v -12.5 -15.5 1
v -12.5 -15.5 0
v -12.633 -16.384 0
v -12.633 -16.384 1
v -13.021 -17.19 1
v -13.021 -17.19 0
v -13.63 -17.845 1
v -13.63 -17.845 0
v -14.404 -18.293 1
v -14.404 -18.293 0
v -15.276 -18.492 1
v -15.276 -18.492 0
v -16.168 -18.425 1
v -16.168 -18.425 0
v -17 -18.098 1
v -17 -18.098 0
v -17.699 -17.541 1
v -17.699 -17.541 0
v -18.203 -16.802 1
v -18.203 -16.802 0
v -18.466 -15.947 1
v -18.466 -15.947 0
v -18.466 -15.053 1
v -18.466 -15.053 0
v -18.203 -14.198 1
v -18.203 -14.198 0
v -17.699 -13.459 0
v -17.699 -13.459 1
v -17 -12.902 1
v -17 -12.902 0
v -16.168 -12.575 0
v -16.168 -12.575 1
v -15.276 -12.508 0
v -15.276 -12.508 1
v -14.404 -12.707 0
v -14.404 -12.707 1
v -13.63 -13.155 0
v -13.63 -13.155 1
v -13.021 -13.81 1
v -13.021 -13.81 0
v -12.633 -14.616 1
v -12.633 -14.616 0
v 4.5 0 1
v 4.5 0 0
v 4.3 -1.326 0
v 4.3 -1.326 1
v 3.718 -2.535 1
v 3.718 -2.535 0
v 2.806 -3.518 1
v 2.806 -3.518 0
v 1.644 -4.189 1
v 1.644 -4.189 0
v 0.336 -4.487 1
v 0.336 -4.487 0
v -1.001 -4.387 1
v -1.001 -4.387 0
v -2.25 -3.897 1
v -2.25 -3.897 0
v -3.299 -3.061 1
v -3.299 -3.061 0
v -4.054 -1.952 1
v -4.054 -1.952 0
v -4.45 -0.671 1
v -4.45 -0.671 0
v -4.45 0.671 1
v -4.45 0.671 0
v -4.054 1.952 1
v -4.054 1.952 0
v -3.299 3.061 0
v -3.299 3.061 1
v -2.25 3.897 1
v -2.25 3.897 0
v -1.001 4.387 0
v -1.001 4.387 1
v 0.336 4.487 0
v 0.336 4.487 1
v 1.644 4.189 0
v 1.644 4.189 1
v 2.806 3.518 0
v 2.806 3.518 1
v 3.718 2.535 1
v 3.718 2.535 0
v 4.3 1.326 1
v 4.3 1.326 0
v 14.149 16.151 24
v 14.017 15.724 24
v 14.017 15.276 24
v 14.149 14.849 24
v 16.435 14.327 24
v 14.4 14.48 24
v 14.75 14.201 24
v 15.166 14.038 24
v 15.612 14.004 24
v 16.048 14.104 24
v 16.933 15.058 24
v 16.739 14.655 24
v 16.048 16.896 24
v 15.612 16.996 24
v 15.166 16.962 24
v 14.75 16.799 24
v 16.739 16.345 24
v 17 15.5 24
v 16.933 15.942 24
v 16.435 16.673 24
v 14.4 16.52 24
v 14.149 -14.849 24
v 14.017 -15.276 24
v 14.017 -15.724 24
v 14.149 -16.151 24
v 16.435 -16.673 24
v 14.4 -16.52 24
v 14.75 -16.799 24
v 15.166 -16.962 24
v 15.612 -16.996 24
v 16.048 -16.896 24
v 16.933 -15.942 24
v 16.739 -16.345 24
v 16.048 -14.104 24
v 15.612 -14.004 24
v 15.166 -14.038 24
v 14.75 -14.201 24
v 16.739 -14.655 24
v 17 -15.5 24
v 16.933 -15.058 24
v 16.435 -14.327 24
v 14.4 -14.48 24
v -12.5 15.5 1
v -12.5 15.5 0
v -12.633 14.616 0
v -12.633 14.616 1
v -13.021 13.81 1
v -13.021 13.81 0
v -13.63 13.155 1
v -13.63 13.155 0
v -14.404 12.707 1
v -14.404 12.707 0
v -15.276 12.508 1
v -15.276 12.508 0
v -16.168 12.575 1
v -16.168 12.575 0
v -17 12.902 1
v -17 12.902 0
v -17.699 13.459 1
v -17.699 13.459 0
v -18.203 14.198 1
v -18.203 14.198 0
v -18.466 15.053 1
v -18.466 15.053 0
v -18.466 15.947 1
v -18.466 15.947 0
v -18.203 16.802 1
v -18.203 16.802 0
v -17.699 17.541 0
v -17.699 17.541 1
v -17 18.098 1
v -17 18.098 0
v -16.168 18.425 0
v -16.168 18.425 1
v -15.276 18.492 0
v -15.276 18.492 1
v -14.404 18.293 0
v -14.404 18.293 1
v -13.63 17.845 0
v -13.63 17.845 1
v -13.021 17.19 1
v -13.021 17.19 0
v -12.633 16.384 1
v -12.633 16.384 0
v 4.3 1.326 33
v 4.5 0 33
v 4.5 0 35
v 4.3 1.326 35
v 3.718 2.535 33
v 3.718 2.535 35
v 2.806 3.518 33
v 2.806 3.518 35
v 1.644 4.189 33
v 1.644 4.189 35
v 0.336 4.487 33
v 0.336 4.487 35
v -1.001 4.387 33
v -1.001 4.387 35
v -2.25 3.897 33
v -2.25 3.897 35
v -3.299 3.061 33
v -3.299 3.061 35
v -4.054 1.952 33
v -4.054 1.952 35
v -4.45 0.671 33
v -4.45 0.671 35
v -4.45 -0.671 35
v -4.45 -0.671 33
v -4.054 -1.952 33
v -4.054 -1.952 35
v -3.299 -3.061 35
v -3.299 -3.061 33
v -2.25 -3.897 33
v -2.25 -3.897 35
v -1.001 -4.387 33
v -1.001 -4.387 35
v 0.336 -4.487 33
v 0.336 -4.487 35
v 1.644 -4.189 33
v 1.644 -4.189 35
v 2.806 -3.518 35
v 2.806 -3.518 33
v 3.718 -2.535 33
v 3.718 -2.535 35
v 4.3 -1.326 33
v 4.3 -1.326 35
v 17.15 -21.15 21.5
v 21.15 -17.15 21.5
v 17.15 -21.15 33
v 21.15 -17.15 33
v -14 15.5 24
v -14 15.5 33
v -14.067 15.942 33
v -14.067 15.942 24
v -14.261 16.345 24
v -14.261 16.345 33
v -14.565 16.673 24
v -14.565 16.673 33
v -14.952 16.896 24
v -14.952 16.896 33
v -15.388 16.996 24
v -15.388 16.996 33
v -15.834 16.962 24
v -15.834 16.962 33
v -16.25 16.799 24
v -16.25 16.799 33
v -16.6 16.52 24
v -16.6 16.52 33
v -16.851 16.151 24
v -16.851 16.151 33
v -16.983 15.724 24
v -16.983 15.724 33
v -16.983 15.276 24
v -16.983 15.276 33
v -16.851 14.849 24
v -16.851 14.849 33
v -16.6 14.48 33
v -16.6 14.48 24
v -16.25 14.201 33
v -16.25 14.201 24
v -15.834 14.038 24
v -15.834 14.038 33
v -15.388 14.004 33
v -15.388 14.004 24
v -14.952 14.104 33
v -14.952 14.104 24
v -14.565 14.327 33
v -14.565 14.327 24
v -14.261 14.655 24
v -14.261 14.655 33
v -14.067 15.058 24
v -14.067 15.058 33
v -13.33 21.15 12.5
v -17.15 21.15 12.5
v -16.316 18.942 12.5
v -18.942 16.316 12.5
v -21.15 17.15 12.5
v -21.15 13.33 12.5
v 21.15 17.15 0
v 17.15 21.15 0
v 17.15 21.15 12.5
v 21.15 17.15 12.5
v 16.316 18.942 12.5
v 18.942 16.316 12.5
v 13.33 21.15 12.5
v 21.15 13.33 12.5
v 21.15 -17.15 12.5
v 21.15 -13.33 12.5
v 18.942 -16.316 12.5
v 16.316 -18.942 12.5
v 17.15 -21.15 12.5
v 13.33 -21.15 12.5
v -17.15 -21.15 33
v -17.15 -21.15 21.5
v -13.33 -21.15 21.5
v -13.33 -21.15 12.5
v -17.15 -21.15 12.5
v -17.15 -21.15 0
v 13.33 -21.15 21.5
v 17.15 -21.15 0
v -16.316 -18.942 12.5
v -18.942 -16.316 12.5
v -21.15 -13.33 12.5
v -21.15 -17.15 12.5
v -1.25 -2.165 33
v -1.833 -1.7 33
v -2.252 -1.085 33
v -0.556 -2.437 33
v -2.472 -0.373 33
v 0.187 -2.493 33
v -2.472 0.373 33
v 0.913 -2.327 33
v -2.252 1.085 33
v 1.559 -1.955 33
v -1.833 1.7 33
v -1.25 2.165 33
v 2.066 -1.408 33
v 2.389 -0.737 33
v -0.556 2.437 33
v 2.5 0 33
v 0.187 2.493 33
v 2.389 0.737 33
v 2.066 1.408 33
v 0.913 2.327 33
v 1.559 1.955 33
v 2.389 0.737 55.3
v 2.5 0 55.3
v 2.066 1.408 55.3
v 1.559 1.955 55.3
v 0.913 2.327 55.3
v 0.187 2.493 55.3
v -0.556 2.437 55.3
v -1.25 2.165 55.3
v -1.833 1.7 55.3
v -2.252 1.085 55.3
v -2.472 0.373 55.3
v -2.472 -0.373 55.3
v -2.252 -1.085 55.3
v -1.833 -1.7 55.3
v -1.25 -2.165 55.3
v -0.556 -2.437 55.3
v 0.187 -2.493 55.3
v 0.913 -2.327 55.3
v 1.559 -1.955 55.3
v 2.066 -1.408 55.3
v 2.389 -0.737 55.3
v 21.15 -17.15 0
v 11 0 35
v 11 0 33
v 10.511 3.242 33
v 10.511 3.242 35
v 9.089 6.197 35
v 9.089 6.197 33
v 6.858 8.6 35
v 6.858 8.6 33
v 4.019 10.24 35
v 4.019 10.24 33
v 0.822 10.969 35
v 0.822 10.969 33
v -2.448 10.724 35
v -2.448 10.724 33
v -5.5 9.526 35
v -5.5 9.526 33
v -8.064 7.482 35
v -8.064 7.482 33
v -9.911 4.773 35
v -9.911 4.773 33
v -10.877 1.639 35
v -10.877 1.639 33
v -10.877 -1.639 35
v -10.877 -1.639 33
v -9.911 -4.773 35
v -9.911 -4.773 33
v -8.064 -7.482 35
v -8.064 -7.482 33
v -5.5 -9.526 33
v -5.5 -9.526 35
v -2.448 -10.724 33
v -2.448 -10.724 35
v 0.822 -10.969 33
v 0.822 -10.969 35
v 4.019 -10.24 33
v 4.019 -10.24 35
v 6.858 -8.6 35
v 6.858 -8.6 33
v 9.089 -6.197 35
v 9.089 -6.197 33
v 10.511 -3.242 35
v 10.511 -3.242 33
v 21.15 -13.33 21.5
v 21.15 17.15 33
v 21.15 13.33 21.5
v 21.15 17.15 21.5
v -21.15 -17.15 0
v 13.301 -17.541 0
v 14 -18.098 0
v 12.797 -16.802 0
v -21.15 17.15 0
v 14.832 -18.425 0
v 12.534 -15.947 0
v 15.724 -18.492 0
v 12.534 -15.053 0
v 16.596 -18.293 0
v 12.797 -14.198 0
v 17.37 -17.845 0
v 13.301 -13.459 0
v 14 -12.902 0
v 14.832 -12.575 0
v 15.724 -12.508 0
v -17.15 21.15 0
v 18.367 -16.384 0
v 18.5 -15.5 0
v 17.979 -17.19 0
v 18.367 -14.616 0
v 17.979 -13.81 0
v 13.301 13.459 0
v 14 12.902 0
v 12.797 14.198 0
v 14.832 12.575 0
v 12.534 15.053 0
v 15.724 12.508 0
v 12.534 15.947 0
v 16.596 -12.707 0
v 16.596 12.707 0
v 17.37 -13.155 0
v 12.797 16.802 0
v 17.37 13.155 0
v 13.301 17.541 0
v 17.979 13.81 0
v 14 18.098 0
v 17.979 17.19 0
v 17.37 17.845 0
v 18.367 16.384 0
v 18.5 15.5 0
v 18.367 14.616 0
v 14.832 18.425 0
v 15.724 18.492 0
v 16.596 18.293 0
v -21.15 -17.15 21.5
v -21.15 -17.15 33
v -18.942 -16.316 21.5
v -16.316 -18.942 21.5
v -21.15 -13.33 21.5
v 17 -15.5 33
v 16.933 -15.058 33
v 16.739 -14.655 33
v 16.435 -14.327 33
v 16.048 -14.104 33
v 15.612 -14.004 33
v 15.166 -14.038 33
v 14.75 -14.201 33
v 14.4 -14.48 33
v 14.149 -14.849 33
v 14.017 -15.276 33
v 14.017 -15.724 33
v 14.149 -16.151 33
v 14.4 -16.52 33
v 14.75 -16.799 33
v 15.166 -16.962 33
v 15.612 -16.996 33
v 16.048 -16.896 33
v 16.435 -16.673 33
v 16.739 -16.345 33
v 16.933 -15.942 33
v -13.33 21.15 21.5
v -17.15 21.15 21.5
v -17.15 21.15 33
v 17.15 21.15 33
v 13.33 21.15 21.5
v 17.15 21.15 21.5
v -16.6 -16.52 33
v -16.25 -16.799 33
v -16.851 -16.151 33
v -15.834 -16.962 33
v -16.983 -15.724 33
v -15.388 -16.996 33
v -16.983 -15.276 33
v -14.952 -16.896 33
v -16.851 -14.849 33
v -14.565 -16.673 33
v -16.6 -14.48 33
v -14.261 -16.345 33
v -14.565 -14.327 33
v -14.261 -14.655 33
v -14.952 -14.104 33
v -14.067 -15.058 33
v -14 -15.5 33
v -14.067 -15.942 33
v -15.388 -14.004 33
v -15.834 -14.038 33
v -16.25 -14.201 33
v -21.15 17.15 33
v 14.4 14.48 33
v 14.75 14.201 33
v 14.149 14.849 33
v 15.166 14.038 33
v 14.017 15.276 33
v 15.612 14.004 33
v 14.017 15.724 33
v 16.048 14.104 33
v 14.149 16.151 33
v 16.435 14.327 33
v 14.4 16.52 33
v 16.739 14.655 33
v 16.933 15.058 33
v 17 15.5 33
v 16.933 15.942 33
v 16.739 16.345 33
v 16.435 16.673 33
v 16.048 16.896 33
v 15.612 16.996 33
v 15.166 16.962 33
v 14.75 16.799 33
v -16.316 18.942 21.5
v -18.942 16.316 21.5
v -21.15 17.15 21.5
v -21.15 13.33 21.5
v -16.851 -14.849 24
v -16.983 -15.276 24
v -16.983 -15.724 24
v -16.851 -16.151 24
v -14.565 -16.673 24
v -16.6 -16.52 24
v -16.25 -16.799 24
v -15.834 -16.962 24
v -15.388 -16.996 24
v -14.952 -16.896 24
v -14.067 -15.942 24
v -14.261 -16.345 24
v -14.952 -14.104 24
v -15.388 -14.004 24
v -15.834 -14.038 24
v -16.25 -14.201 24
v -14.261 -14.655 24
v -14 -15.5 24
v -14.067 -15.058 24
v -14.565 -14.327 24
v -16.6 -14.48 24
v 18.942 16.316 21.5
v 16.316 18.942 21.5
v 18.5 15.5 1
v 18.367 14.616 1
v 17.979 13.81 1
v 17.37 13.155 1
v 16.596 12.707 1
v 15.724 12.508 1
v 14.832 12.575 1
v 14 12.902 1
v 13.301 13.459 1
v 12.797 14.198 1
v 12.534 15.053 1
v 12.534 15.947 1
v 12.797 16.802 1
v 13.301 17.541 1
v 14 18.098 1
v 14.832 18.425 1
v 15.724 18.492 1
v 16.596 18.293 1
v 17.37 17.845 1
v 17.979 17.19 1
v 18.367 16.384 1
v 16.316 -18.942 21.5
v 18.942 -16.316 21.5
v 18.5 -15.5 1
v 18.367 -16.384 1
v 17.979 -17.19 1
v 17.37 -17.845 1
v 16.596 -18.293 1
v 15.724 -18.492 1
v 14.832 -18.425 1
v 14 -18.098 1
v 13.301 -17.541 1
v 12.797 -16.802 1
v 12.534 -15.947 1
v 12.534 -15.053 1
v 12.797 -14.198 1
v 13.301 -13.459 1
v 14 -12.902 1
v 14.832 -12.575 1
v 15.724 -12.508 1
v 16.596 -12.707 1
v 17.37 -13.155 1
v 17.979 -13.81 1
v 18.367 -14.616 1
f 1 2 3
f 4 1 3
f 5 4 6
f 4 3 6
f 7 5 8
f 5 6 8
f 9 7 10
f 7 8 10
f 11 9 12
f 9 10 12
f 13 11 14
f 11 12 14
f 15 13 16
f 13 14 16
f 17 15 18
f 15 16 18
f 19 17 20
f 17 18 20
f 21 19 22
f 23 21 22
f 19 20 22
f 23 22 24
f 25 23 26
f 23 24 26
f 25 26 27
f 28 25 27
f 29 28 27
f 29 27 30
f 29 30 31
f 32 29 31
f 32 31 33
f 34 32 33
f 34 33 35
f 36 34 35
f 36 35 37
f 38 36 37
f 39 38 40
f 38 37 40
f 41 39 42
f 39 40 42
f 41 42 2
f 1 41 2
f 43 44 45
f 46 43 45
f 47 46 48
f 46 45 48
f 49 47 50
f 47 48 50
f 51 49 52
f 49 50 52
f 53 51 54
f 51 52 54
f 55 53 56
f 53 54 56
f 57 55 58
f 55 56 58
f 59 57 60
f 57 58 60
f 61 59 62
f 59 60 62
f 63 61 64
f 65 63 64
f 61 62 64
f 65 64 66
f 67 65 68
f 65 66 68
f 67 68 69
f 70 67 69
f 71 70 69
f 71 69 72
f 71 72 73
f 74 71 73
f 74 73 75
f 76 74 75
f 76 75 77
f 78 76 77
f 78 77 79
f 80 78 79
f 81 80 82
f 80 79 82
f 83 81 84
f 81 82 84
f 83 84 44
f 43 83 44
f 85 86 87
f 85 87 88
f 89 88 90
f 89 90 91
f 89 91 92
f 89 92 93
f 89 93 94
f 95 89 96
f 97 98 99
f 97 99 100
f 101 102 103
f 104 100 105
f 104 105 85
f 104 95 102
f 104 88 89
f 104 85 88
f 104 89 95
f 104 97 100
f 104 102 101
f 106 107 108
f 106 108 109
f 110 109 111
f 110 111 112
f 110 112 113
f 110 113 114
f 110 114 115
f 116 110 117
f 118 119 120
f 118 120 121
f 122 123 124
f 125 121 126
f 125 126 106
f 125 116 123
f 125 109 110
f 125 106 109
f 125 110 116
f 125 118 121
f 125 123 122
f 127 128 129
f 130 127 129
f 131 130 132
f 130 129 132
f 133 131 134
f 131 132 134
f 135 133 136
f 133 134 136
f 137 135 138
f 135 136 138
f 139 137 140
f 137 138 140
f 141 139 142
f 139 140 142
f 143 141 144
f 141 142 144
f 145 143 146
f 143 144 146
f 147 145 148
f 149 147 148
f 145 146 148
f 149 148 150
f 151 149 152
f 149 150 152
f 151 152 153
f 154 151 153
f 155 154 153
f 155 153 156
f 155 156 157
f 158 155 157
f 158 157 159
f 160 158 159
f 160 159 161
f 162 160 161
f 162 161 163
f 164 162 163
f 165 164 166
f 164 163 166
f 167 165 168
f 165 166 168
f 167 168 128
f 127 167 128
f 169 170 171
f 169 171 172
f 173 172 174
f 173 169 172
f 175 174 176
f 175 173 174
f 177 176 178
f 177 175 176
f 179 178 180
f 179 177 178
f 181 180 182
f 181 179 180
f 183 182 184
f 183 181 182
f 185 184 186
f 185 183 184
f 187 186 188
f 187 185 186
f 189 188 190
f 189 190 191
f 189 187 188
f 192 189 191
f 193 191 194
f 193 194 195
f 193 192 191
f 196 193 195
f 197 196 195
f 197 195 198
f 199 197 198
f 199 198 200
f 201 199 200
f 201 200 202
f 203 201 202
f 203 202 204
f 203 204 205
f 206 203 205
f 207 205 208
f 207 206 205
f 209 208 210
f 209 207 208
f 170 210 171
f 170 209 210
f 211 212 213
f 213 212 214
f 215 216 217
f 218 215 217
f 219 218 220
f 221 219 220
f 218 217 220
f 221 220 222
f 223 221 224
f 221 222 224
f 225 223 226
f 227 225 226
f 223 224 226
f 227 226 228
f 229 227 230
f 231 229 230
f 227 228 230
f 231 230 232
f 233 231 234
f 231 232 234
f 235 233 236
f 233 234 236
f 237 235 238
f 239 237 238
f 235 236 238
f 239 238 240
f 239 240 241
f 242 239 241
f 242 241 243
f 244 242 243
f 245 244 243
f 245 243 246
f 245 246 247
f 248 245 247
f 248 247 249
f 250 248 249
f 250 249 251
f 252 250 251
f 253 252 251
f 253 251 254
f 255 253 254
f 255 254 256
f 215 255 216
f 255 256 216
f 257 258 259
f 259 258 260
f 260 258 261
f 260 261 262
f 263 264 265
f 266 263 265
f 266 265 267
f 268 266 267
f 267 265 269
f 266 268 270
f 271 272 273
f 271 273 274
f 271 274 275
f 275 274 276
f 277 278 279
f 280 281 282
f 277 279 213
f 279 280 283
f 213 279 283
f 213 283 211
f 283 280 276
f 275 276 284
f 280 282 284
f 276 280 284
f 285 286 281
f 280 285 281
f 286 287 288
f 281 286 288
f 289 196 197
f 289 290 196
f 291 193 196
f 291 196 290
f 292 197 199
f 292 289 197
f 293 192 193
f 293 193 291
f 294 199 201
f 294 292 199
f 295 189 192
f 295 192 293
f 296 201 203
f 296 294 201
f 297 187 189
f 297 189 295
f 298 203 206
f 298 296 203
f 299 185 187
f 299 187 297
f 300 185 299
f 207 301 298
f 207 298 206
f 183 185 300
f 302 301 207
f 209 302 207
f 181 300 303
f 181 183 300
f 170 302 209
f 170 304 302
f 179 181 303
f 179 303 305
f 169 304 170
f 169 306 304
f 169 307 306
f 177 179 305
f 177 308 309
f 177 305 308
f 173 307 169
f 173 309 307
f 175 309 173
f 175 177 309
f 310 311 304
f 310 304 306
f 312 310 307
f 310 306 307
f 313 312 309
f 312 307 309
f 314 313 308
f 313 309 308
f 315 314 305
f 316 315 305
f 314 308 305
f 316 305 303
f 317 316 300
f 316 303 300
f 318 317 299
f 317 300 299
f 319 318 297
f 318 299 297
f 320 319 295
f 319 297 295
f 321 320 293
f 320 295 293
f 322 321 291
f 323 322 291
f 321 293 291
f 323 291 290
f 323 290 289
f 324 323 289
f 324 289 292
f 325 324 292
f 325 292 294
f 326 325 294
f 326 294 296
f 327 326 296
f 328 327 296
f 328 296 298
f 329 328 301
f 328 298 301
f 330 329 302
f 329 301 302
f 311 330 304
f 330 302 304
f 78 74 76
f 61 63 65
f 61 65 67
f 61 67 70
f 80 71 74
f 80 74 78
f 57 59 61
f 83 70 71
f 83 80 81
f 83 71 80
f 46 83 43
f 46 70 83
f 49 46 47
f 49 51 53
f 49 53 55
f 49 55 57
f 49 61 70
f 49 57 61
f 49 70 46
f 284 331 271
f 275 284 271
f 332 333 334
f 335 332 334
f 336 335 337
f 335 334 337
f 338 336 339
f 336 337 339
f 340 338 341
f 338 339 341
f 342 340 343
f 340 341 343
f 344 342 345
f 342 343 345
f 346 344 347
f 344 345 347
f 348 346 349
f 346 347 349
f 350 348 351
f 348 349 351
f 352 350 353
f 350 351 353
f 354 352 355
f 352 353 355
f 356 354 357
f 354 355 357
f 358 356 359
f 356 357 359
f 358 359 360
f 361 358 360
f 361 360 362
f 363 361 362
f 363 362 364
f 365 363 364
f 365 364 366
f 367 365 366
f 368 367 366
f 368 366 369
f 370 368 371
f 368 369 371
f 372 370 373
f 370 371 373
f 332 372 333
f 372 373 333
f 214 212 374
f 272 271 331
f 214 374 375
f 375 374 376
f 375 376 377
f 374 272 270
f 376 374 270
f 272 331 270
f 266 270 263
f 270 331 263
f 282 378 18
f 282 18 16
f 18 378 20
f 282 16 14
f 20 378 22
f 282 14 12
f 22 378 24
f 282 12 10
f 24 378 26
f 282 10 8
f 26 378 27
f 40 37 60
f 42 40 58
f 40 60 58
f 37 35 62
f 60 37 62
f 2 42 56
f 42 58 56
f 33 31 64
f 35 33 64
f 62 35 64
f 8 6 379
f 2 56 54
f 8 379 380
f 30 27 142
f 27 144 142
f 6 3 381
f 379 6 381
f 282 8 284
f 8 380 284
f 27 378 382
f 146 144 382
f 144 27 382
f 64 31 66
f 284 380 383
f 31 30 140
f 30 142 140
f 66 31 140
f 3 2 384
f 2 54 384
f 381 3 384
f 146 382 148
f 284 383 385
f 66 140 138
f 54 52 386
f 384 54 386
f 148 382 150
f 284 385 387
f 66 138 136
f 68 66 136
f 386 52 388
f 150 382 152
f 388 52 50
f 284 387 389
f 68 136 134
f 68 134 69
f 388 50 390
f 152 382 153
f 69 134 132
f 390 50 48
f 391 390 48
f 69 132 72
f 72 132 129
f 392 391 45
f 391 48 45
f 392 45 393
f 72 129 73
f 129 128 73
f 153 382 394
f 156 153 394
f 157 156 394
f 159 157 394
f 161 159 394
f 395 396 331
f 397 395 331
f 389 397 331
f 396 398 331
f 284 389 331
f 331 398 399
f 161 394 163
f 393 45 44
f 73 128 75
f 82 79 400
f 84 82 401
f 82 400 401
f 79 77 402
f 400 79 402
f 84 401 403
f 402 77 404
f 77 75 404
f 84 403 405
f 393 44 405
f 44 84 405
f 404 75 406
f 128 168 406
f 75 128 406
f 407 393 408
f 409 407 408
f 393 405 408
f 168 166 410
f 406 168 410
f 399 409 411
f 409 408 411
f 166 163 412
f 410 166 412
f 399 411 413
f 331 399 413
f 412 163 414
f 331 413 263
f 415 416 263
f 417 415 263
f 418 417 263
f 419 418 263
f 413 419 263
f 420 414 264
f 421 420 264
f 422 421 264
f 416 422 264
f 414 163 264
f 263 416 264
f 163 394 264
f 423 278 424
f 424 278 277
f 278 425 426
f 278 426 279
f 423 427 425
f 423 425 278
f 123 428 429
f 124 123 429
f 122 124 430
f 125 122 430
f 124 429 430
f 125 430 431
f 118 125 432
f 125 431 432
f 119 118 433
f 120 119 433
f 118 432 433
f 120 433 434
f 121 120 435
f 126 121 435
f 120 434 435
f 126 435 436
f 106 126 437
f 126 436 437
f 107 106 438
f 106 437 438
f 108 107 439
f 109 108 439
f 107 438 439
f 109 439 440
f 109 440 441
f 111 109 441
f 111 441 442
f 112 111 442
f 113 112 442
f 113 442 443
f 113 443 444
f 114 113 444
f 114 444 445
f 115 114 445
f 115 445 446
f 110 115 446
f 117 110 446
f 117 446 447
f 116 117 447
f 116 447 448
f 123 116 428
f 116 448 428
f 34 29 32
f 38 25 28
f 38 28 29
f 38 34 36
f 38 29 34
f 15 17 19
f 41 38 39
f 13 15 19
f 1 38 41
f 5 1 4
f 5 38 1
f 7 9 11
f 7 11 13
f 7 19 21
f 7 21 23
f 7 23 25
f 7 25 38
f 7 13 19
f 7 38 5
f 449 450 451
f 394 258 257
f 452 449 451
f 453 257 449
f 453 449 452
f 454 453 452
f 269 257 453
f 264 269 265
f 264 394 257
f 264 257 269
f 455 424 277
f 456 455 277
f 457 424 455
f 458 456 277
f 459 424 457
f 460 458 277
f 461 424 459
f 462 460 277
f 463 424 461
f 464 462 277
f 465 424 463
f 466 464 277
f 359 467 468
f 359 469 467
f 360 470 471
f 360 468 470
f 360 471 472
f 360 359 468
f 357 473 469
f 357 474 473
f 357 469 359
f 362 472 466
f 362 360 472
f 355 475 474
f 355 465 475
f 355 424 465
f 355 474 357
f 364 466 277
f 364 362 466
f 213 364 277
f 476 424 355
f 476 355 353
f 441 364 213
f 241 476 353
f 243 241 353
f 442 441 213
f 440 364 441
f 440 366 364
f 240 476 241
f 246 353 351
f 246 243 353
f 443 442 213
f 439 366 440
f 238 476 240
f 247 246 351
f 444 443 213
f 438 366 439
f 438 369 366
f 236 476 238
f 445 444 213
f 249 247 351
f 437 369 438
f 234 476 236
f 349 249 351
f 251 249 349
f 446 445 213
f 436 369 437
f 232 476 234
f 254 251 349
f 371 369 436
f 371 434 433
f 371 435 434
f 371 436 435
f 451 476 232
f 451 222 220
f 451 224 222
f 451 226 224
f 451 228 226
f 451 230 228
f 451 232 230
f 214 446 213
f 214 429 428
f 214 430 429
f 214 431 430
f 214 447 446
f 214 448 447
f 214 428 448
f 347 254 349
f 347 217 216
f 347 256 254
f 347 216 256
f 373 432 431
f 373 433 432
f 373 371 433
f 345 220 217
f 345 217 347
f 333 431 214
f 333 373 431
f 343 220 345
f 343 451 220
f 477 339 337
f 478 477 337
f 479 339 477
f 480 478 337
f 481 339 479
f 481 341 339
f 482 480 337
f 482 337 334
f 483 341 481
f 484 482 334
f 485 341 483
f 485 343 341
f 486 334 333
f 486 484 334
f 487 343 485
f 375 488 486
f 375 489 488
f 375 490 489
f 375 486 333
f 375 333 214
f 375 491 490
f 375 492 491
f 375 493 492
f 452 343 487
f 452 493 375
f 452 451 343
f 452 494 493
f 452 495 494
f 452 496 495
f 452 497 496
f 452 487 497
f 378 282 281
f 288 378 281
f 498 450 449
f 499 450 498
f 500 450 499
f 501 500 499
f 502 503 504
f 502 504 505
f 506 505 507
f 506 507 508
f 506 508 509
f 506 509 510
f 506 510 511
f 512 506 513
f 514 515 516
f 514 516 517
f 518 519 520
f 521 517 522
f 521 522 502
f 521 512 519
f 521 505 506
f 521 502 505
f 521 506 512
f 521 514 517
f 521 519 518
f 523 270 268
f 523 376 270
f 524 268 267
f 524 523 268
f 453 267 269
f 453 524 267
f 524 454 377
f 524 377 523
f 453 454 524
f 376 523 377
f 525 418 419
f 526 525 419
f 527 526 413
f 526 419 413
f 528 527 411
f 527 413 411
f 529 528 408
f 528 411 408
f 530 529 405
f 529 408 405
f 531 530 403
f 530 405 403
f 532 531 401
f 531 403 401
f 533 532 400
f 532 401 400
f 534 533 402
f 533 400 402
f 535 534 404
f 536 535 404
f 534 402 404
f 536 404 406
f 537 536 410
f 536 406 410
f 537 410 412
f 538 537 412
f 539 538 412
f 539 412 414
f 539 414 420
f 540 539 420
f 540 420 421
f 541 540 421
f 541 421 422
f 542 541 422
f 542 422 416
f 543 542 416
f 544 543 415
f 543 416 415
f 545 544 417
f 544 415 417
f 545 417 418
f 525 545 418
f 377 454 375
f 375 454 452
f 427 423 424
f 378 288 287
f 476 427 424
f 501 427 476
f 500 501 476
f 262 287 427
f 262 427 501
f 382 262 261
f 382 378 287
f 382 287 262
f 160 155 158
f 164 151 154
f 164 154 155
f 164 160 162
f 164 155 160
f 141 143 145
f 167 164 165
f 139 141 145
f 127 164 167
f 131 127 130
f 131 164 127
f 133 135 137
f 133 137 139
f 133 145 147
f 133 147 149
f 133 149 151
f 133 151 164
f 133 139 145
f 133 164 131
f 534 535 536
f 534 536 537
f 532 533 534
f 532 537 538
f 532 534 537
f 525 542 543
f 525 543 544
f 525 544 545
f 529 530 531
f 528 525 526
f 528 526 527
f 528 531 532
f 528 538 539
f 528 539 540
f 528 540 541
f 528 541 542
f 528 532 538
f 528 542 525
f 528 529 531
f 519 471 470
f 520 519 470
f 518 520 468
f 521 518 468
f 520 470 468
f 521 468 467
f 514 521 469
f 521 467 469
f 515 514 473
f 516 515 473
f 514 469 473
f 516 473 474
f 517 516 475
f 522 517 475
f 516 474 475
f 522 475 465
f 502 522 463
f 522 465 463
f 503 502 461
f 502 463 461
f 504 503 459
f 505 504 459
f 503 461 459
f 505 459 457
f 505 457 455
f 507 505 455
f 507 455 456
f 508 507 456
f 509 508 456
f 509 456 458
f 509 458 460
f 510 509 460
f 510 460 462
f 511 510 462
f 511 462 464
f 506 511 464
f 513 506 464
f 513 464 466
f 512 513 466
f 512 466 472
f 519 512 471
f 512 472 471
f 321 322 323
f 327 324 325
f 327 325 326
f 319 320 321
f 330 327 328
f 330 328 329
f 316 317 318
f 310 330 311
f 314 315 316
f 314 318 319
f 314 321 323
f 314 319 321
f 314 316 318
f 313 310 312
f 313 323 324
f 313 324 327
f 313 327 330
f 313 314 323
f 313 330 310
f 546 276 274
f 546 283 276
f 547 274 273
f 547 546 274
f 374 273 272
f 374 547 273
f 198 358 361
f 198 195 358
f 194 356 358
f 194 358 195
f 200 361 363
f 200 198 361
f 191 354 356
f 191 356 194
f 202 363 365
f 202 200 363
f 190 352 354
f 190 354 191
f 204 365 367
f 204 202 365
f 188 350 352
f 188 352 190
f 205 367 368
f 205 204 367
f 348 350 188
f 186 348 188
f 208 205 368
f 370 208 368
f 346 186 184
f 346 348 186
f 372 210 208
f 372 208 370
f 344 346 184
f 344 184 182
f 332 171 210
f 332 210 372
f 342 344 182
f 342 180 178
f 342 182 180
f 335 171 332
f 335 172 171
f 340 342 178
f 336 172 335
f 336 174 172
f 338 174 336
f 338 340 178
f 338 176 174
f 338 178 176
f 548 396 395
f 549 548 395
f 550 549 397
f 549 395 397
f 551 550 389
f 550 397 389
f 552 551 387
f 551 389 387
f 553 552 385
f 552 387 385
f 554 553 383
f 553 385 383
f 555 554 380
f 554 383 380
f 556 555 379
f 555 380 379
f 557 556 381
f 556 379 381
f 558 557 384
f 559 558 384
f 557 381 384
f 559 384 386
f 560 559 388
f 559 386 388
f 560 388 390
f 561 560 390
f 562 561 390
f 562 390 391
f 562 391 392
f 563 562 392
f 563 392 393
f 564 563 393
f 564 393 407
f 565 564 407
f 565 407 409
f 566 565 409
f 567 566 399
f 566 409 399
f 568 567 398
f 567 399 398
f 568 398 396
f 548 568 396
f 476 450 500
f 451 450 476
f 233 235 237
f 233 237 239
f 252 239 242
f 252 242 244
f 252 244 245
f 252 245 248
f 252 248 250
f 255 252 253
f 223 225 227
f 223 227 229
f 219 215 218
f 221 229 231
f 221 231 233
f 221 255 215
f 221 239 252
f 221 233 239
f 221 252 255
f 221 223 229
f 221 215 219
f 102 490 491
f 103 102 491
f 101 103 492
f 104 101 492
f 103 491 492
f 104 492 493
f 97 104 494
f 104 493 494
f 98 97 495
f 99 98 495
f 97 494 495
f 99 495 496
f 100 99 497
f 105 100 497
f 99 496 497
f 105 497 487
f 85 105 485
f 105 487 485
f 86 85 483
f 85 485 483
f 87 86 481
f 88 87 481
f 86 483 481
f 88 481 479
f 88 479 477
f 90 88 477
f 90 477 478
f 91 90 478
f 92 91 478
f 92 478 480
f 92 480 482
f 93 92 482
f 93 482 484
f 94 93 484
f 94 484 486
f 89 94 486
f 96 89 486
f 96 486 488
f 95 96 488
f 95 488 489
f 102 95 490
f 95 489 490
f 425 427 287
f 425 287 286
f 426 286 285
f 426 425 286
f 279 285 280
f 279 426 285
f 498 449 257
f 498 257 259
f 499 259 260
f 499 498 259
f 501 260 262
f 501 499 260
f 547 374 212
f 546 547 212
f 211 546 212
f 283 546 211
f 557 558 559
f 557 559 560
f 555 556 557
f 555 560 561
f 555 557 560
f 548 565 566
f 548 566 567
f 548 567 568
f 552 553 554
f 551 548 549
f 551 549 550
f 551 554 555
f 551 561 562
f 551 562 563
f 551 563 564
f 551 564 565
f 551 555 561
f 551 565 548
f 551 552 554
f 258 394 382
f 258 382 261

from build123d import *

# Parameters (mm, degrees)
F0_W      = 42.3
F0_H      = 42.3
F1_DEPTH  = 33
F2_SIZE   = 4
F3_R      = 11
F3_R_2    = 4.5
F4_DEPTH  = 2
F5_R      = 1.5
F6_DEPTH  = 9
F7_R      = 4.5
F7_R_2    = 3
F8_DEPTH  = 1
F9_R      = 2.5
F10_DEPTH = 22.3
F11_W     = 6.266167
F11_H     = 9


with BuildPart() as f1:
    # F0 (on Top) → F1 (new body)
    with BuildSketch(Plane.XY):
        Rectangle(F0_W, F0_H)
    extrude(amount=F1_DEPTH)

    # F2
    f2_edges = [f1.edges().sort_by_distance(p)[0] for p in [
        (21.15, -21.15, 16.5),
        (-21.15, -21.15, 16.5),
        (21.15, 21.15, 16.5),
        (-21.15, 21.15, 16.5),
    ]]
    chamfer(f2_edges, length=F2_SIZE)

    # F3 (on face) → F4 (join)
    with BuildSketch(Plane.XY.offset(33)):
        Circle(F3_R)
        Circle(F3_R_2, mode=Mode.SUBTRACT)
    extrude(amount=F4_DEPTH)

    # F5 (on face) → F6 (cut)
    with BuildSketch(Plane.XY.offset(33)):
        with Locations((15.5, 15.5)):
            Circle(F5_R)
        with Locations((15.5, -15.5)):
            Circle(F5_R)
        with Locations((-15.5, -15.5)):
            Circle(F5_R)
        with Locations((-15.5, 15.5)):
            Circle(F5_R)
    extrude(amount=-F6_DEPTH, mode=Mode.SUBTRACT)

    # F7 (on face) → F8 (cut)
    with BuildSketch(Plane(origin=(0, 0, 0), x_dir=(1, 0, 0), z_dir=(0, 0, -1))):
        Circle(F7_R)
        with Locations((-15.5, 15.5)):
            Circle(F7_R_2)
        with Locations((-15.5, -15.5)):
            Circle(F7_R_2)
        with Locations((15.5, -15.5)):
            Circle(F7_R_2)
        with Locations((15.5, 15.5)):
            Circle(F7_R_2)
    extrude(amount=-F8_DEPTH, mode=Mode.SUBTRACT)

    # F9 (on face) → F10 (join)
    with BuildSketch(Plane.XY.offset(33)):
        Circle(F9_R)
    extrude(amount=F10_DEPTH)

    # F11 (on Right) → F12 (revolve, cut)
    with BuildSketch(Plane.YZ):
        with Locations((28.133083, 17)):
            Rectangle(F11_W, F11_H)
    revolve(axis=Axis((0, 0, 12.553133), (0, 0, 1)), mode=Mode.SUBTRACT)


solid = f1.part
